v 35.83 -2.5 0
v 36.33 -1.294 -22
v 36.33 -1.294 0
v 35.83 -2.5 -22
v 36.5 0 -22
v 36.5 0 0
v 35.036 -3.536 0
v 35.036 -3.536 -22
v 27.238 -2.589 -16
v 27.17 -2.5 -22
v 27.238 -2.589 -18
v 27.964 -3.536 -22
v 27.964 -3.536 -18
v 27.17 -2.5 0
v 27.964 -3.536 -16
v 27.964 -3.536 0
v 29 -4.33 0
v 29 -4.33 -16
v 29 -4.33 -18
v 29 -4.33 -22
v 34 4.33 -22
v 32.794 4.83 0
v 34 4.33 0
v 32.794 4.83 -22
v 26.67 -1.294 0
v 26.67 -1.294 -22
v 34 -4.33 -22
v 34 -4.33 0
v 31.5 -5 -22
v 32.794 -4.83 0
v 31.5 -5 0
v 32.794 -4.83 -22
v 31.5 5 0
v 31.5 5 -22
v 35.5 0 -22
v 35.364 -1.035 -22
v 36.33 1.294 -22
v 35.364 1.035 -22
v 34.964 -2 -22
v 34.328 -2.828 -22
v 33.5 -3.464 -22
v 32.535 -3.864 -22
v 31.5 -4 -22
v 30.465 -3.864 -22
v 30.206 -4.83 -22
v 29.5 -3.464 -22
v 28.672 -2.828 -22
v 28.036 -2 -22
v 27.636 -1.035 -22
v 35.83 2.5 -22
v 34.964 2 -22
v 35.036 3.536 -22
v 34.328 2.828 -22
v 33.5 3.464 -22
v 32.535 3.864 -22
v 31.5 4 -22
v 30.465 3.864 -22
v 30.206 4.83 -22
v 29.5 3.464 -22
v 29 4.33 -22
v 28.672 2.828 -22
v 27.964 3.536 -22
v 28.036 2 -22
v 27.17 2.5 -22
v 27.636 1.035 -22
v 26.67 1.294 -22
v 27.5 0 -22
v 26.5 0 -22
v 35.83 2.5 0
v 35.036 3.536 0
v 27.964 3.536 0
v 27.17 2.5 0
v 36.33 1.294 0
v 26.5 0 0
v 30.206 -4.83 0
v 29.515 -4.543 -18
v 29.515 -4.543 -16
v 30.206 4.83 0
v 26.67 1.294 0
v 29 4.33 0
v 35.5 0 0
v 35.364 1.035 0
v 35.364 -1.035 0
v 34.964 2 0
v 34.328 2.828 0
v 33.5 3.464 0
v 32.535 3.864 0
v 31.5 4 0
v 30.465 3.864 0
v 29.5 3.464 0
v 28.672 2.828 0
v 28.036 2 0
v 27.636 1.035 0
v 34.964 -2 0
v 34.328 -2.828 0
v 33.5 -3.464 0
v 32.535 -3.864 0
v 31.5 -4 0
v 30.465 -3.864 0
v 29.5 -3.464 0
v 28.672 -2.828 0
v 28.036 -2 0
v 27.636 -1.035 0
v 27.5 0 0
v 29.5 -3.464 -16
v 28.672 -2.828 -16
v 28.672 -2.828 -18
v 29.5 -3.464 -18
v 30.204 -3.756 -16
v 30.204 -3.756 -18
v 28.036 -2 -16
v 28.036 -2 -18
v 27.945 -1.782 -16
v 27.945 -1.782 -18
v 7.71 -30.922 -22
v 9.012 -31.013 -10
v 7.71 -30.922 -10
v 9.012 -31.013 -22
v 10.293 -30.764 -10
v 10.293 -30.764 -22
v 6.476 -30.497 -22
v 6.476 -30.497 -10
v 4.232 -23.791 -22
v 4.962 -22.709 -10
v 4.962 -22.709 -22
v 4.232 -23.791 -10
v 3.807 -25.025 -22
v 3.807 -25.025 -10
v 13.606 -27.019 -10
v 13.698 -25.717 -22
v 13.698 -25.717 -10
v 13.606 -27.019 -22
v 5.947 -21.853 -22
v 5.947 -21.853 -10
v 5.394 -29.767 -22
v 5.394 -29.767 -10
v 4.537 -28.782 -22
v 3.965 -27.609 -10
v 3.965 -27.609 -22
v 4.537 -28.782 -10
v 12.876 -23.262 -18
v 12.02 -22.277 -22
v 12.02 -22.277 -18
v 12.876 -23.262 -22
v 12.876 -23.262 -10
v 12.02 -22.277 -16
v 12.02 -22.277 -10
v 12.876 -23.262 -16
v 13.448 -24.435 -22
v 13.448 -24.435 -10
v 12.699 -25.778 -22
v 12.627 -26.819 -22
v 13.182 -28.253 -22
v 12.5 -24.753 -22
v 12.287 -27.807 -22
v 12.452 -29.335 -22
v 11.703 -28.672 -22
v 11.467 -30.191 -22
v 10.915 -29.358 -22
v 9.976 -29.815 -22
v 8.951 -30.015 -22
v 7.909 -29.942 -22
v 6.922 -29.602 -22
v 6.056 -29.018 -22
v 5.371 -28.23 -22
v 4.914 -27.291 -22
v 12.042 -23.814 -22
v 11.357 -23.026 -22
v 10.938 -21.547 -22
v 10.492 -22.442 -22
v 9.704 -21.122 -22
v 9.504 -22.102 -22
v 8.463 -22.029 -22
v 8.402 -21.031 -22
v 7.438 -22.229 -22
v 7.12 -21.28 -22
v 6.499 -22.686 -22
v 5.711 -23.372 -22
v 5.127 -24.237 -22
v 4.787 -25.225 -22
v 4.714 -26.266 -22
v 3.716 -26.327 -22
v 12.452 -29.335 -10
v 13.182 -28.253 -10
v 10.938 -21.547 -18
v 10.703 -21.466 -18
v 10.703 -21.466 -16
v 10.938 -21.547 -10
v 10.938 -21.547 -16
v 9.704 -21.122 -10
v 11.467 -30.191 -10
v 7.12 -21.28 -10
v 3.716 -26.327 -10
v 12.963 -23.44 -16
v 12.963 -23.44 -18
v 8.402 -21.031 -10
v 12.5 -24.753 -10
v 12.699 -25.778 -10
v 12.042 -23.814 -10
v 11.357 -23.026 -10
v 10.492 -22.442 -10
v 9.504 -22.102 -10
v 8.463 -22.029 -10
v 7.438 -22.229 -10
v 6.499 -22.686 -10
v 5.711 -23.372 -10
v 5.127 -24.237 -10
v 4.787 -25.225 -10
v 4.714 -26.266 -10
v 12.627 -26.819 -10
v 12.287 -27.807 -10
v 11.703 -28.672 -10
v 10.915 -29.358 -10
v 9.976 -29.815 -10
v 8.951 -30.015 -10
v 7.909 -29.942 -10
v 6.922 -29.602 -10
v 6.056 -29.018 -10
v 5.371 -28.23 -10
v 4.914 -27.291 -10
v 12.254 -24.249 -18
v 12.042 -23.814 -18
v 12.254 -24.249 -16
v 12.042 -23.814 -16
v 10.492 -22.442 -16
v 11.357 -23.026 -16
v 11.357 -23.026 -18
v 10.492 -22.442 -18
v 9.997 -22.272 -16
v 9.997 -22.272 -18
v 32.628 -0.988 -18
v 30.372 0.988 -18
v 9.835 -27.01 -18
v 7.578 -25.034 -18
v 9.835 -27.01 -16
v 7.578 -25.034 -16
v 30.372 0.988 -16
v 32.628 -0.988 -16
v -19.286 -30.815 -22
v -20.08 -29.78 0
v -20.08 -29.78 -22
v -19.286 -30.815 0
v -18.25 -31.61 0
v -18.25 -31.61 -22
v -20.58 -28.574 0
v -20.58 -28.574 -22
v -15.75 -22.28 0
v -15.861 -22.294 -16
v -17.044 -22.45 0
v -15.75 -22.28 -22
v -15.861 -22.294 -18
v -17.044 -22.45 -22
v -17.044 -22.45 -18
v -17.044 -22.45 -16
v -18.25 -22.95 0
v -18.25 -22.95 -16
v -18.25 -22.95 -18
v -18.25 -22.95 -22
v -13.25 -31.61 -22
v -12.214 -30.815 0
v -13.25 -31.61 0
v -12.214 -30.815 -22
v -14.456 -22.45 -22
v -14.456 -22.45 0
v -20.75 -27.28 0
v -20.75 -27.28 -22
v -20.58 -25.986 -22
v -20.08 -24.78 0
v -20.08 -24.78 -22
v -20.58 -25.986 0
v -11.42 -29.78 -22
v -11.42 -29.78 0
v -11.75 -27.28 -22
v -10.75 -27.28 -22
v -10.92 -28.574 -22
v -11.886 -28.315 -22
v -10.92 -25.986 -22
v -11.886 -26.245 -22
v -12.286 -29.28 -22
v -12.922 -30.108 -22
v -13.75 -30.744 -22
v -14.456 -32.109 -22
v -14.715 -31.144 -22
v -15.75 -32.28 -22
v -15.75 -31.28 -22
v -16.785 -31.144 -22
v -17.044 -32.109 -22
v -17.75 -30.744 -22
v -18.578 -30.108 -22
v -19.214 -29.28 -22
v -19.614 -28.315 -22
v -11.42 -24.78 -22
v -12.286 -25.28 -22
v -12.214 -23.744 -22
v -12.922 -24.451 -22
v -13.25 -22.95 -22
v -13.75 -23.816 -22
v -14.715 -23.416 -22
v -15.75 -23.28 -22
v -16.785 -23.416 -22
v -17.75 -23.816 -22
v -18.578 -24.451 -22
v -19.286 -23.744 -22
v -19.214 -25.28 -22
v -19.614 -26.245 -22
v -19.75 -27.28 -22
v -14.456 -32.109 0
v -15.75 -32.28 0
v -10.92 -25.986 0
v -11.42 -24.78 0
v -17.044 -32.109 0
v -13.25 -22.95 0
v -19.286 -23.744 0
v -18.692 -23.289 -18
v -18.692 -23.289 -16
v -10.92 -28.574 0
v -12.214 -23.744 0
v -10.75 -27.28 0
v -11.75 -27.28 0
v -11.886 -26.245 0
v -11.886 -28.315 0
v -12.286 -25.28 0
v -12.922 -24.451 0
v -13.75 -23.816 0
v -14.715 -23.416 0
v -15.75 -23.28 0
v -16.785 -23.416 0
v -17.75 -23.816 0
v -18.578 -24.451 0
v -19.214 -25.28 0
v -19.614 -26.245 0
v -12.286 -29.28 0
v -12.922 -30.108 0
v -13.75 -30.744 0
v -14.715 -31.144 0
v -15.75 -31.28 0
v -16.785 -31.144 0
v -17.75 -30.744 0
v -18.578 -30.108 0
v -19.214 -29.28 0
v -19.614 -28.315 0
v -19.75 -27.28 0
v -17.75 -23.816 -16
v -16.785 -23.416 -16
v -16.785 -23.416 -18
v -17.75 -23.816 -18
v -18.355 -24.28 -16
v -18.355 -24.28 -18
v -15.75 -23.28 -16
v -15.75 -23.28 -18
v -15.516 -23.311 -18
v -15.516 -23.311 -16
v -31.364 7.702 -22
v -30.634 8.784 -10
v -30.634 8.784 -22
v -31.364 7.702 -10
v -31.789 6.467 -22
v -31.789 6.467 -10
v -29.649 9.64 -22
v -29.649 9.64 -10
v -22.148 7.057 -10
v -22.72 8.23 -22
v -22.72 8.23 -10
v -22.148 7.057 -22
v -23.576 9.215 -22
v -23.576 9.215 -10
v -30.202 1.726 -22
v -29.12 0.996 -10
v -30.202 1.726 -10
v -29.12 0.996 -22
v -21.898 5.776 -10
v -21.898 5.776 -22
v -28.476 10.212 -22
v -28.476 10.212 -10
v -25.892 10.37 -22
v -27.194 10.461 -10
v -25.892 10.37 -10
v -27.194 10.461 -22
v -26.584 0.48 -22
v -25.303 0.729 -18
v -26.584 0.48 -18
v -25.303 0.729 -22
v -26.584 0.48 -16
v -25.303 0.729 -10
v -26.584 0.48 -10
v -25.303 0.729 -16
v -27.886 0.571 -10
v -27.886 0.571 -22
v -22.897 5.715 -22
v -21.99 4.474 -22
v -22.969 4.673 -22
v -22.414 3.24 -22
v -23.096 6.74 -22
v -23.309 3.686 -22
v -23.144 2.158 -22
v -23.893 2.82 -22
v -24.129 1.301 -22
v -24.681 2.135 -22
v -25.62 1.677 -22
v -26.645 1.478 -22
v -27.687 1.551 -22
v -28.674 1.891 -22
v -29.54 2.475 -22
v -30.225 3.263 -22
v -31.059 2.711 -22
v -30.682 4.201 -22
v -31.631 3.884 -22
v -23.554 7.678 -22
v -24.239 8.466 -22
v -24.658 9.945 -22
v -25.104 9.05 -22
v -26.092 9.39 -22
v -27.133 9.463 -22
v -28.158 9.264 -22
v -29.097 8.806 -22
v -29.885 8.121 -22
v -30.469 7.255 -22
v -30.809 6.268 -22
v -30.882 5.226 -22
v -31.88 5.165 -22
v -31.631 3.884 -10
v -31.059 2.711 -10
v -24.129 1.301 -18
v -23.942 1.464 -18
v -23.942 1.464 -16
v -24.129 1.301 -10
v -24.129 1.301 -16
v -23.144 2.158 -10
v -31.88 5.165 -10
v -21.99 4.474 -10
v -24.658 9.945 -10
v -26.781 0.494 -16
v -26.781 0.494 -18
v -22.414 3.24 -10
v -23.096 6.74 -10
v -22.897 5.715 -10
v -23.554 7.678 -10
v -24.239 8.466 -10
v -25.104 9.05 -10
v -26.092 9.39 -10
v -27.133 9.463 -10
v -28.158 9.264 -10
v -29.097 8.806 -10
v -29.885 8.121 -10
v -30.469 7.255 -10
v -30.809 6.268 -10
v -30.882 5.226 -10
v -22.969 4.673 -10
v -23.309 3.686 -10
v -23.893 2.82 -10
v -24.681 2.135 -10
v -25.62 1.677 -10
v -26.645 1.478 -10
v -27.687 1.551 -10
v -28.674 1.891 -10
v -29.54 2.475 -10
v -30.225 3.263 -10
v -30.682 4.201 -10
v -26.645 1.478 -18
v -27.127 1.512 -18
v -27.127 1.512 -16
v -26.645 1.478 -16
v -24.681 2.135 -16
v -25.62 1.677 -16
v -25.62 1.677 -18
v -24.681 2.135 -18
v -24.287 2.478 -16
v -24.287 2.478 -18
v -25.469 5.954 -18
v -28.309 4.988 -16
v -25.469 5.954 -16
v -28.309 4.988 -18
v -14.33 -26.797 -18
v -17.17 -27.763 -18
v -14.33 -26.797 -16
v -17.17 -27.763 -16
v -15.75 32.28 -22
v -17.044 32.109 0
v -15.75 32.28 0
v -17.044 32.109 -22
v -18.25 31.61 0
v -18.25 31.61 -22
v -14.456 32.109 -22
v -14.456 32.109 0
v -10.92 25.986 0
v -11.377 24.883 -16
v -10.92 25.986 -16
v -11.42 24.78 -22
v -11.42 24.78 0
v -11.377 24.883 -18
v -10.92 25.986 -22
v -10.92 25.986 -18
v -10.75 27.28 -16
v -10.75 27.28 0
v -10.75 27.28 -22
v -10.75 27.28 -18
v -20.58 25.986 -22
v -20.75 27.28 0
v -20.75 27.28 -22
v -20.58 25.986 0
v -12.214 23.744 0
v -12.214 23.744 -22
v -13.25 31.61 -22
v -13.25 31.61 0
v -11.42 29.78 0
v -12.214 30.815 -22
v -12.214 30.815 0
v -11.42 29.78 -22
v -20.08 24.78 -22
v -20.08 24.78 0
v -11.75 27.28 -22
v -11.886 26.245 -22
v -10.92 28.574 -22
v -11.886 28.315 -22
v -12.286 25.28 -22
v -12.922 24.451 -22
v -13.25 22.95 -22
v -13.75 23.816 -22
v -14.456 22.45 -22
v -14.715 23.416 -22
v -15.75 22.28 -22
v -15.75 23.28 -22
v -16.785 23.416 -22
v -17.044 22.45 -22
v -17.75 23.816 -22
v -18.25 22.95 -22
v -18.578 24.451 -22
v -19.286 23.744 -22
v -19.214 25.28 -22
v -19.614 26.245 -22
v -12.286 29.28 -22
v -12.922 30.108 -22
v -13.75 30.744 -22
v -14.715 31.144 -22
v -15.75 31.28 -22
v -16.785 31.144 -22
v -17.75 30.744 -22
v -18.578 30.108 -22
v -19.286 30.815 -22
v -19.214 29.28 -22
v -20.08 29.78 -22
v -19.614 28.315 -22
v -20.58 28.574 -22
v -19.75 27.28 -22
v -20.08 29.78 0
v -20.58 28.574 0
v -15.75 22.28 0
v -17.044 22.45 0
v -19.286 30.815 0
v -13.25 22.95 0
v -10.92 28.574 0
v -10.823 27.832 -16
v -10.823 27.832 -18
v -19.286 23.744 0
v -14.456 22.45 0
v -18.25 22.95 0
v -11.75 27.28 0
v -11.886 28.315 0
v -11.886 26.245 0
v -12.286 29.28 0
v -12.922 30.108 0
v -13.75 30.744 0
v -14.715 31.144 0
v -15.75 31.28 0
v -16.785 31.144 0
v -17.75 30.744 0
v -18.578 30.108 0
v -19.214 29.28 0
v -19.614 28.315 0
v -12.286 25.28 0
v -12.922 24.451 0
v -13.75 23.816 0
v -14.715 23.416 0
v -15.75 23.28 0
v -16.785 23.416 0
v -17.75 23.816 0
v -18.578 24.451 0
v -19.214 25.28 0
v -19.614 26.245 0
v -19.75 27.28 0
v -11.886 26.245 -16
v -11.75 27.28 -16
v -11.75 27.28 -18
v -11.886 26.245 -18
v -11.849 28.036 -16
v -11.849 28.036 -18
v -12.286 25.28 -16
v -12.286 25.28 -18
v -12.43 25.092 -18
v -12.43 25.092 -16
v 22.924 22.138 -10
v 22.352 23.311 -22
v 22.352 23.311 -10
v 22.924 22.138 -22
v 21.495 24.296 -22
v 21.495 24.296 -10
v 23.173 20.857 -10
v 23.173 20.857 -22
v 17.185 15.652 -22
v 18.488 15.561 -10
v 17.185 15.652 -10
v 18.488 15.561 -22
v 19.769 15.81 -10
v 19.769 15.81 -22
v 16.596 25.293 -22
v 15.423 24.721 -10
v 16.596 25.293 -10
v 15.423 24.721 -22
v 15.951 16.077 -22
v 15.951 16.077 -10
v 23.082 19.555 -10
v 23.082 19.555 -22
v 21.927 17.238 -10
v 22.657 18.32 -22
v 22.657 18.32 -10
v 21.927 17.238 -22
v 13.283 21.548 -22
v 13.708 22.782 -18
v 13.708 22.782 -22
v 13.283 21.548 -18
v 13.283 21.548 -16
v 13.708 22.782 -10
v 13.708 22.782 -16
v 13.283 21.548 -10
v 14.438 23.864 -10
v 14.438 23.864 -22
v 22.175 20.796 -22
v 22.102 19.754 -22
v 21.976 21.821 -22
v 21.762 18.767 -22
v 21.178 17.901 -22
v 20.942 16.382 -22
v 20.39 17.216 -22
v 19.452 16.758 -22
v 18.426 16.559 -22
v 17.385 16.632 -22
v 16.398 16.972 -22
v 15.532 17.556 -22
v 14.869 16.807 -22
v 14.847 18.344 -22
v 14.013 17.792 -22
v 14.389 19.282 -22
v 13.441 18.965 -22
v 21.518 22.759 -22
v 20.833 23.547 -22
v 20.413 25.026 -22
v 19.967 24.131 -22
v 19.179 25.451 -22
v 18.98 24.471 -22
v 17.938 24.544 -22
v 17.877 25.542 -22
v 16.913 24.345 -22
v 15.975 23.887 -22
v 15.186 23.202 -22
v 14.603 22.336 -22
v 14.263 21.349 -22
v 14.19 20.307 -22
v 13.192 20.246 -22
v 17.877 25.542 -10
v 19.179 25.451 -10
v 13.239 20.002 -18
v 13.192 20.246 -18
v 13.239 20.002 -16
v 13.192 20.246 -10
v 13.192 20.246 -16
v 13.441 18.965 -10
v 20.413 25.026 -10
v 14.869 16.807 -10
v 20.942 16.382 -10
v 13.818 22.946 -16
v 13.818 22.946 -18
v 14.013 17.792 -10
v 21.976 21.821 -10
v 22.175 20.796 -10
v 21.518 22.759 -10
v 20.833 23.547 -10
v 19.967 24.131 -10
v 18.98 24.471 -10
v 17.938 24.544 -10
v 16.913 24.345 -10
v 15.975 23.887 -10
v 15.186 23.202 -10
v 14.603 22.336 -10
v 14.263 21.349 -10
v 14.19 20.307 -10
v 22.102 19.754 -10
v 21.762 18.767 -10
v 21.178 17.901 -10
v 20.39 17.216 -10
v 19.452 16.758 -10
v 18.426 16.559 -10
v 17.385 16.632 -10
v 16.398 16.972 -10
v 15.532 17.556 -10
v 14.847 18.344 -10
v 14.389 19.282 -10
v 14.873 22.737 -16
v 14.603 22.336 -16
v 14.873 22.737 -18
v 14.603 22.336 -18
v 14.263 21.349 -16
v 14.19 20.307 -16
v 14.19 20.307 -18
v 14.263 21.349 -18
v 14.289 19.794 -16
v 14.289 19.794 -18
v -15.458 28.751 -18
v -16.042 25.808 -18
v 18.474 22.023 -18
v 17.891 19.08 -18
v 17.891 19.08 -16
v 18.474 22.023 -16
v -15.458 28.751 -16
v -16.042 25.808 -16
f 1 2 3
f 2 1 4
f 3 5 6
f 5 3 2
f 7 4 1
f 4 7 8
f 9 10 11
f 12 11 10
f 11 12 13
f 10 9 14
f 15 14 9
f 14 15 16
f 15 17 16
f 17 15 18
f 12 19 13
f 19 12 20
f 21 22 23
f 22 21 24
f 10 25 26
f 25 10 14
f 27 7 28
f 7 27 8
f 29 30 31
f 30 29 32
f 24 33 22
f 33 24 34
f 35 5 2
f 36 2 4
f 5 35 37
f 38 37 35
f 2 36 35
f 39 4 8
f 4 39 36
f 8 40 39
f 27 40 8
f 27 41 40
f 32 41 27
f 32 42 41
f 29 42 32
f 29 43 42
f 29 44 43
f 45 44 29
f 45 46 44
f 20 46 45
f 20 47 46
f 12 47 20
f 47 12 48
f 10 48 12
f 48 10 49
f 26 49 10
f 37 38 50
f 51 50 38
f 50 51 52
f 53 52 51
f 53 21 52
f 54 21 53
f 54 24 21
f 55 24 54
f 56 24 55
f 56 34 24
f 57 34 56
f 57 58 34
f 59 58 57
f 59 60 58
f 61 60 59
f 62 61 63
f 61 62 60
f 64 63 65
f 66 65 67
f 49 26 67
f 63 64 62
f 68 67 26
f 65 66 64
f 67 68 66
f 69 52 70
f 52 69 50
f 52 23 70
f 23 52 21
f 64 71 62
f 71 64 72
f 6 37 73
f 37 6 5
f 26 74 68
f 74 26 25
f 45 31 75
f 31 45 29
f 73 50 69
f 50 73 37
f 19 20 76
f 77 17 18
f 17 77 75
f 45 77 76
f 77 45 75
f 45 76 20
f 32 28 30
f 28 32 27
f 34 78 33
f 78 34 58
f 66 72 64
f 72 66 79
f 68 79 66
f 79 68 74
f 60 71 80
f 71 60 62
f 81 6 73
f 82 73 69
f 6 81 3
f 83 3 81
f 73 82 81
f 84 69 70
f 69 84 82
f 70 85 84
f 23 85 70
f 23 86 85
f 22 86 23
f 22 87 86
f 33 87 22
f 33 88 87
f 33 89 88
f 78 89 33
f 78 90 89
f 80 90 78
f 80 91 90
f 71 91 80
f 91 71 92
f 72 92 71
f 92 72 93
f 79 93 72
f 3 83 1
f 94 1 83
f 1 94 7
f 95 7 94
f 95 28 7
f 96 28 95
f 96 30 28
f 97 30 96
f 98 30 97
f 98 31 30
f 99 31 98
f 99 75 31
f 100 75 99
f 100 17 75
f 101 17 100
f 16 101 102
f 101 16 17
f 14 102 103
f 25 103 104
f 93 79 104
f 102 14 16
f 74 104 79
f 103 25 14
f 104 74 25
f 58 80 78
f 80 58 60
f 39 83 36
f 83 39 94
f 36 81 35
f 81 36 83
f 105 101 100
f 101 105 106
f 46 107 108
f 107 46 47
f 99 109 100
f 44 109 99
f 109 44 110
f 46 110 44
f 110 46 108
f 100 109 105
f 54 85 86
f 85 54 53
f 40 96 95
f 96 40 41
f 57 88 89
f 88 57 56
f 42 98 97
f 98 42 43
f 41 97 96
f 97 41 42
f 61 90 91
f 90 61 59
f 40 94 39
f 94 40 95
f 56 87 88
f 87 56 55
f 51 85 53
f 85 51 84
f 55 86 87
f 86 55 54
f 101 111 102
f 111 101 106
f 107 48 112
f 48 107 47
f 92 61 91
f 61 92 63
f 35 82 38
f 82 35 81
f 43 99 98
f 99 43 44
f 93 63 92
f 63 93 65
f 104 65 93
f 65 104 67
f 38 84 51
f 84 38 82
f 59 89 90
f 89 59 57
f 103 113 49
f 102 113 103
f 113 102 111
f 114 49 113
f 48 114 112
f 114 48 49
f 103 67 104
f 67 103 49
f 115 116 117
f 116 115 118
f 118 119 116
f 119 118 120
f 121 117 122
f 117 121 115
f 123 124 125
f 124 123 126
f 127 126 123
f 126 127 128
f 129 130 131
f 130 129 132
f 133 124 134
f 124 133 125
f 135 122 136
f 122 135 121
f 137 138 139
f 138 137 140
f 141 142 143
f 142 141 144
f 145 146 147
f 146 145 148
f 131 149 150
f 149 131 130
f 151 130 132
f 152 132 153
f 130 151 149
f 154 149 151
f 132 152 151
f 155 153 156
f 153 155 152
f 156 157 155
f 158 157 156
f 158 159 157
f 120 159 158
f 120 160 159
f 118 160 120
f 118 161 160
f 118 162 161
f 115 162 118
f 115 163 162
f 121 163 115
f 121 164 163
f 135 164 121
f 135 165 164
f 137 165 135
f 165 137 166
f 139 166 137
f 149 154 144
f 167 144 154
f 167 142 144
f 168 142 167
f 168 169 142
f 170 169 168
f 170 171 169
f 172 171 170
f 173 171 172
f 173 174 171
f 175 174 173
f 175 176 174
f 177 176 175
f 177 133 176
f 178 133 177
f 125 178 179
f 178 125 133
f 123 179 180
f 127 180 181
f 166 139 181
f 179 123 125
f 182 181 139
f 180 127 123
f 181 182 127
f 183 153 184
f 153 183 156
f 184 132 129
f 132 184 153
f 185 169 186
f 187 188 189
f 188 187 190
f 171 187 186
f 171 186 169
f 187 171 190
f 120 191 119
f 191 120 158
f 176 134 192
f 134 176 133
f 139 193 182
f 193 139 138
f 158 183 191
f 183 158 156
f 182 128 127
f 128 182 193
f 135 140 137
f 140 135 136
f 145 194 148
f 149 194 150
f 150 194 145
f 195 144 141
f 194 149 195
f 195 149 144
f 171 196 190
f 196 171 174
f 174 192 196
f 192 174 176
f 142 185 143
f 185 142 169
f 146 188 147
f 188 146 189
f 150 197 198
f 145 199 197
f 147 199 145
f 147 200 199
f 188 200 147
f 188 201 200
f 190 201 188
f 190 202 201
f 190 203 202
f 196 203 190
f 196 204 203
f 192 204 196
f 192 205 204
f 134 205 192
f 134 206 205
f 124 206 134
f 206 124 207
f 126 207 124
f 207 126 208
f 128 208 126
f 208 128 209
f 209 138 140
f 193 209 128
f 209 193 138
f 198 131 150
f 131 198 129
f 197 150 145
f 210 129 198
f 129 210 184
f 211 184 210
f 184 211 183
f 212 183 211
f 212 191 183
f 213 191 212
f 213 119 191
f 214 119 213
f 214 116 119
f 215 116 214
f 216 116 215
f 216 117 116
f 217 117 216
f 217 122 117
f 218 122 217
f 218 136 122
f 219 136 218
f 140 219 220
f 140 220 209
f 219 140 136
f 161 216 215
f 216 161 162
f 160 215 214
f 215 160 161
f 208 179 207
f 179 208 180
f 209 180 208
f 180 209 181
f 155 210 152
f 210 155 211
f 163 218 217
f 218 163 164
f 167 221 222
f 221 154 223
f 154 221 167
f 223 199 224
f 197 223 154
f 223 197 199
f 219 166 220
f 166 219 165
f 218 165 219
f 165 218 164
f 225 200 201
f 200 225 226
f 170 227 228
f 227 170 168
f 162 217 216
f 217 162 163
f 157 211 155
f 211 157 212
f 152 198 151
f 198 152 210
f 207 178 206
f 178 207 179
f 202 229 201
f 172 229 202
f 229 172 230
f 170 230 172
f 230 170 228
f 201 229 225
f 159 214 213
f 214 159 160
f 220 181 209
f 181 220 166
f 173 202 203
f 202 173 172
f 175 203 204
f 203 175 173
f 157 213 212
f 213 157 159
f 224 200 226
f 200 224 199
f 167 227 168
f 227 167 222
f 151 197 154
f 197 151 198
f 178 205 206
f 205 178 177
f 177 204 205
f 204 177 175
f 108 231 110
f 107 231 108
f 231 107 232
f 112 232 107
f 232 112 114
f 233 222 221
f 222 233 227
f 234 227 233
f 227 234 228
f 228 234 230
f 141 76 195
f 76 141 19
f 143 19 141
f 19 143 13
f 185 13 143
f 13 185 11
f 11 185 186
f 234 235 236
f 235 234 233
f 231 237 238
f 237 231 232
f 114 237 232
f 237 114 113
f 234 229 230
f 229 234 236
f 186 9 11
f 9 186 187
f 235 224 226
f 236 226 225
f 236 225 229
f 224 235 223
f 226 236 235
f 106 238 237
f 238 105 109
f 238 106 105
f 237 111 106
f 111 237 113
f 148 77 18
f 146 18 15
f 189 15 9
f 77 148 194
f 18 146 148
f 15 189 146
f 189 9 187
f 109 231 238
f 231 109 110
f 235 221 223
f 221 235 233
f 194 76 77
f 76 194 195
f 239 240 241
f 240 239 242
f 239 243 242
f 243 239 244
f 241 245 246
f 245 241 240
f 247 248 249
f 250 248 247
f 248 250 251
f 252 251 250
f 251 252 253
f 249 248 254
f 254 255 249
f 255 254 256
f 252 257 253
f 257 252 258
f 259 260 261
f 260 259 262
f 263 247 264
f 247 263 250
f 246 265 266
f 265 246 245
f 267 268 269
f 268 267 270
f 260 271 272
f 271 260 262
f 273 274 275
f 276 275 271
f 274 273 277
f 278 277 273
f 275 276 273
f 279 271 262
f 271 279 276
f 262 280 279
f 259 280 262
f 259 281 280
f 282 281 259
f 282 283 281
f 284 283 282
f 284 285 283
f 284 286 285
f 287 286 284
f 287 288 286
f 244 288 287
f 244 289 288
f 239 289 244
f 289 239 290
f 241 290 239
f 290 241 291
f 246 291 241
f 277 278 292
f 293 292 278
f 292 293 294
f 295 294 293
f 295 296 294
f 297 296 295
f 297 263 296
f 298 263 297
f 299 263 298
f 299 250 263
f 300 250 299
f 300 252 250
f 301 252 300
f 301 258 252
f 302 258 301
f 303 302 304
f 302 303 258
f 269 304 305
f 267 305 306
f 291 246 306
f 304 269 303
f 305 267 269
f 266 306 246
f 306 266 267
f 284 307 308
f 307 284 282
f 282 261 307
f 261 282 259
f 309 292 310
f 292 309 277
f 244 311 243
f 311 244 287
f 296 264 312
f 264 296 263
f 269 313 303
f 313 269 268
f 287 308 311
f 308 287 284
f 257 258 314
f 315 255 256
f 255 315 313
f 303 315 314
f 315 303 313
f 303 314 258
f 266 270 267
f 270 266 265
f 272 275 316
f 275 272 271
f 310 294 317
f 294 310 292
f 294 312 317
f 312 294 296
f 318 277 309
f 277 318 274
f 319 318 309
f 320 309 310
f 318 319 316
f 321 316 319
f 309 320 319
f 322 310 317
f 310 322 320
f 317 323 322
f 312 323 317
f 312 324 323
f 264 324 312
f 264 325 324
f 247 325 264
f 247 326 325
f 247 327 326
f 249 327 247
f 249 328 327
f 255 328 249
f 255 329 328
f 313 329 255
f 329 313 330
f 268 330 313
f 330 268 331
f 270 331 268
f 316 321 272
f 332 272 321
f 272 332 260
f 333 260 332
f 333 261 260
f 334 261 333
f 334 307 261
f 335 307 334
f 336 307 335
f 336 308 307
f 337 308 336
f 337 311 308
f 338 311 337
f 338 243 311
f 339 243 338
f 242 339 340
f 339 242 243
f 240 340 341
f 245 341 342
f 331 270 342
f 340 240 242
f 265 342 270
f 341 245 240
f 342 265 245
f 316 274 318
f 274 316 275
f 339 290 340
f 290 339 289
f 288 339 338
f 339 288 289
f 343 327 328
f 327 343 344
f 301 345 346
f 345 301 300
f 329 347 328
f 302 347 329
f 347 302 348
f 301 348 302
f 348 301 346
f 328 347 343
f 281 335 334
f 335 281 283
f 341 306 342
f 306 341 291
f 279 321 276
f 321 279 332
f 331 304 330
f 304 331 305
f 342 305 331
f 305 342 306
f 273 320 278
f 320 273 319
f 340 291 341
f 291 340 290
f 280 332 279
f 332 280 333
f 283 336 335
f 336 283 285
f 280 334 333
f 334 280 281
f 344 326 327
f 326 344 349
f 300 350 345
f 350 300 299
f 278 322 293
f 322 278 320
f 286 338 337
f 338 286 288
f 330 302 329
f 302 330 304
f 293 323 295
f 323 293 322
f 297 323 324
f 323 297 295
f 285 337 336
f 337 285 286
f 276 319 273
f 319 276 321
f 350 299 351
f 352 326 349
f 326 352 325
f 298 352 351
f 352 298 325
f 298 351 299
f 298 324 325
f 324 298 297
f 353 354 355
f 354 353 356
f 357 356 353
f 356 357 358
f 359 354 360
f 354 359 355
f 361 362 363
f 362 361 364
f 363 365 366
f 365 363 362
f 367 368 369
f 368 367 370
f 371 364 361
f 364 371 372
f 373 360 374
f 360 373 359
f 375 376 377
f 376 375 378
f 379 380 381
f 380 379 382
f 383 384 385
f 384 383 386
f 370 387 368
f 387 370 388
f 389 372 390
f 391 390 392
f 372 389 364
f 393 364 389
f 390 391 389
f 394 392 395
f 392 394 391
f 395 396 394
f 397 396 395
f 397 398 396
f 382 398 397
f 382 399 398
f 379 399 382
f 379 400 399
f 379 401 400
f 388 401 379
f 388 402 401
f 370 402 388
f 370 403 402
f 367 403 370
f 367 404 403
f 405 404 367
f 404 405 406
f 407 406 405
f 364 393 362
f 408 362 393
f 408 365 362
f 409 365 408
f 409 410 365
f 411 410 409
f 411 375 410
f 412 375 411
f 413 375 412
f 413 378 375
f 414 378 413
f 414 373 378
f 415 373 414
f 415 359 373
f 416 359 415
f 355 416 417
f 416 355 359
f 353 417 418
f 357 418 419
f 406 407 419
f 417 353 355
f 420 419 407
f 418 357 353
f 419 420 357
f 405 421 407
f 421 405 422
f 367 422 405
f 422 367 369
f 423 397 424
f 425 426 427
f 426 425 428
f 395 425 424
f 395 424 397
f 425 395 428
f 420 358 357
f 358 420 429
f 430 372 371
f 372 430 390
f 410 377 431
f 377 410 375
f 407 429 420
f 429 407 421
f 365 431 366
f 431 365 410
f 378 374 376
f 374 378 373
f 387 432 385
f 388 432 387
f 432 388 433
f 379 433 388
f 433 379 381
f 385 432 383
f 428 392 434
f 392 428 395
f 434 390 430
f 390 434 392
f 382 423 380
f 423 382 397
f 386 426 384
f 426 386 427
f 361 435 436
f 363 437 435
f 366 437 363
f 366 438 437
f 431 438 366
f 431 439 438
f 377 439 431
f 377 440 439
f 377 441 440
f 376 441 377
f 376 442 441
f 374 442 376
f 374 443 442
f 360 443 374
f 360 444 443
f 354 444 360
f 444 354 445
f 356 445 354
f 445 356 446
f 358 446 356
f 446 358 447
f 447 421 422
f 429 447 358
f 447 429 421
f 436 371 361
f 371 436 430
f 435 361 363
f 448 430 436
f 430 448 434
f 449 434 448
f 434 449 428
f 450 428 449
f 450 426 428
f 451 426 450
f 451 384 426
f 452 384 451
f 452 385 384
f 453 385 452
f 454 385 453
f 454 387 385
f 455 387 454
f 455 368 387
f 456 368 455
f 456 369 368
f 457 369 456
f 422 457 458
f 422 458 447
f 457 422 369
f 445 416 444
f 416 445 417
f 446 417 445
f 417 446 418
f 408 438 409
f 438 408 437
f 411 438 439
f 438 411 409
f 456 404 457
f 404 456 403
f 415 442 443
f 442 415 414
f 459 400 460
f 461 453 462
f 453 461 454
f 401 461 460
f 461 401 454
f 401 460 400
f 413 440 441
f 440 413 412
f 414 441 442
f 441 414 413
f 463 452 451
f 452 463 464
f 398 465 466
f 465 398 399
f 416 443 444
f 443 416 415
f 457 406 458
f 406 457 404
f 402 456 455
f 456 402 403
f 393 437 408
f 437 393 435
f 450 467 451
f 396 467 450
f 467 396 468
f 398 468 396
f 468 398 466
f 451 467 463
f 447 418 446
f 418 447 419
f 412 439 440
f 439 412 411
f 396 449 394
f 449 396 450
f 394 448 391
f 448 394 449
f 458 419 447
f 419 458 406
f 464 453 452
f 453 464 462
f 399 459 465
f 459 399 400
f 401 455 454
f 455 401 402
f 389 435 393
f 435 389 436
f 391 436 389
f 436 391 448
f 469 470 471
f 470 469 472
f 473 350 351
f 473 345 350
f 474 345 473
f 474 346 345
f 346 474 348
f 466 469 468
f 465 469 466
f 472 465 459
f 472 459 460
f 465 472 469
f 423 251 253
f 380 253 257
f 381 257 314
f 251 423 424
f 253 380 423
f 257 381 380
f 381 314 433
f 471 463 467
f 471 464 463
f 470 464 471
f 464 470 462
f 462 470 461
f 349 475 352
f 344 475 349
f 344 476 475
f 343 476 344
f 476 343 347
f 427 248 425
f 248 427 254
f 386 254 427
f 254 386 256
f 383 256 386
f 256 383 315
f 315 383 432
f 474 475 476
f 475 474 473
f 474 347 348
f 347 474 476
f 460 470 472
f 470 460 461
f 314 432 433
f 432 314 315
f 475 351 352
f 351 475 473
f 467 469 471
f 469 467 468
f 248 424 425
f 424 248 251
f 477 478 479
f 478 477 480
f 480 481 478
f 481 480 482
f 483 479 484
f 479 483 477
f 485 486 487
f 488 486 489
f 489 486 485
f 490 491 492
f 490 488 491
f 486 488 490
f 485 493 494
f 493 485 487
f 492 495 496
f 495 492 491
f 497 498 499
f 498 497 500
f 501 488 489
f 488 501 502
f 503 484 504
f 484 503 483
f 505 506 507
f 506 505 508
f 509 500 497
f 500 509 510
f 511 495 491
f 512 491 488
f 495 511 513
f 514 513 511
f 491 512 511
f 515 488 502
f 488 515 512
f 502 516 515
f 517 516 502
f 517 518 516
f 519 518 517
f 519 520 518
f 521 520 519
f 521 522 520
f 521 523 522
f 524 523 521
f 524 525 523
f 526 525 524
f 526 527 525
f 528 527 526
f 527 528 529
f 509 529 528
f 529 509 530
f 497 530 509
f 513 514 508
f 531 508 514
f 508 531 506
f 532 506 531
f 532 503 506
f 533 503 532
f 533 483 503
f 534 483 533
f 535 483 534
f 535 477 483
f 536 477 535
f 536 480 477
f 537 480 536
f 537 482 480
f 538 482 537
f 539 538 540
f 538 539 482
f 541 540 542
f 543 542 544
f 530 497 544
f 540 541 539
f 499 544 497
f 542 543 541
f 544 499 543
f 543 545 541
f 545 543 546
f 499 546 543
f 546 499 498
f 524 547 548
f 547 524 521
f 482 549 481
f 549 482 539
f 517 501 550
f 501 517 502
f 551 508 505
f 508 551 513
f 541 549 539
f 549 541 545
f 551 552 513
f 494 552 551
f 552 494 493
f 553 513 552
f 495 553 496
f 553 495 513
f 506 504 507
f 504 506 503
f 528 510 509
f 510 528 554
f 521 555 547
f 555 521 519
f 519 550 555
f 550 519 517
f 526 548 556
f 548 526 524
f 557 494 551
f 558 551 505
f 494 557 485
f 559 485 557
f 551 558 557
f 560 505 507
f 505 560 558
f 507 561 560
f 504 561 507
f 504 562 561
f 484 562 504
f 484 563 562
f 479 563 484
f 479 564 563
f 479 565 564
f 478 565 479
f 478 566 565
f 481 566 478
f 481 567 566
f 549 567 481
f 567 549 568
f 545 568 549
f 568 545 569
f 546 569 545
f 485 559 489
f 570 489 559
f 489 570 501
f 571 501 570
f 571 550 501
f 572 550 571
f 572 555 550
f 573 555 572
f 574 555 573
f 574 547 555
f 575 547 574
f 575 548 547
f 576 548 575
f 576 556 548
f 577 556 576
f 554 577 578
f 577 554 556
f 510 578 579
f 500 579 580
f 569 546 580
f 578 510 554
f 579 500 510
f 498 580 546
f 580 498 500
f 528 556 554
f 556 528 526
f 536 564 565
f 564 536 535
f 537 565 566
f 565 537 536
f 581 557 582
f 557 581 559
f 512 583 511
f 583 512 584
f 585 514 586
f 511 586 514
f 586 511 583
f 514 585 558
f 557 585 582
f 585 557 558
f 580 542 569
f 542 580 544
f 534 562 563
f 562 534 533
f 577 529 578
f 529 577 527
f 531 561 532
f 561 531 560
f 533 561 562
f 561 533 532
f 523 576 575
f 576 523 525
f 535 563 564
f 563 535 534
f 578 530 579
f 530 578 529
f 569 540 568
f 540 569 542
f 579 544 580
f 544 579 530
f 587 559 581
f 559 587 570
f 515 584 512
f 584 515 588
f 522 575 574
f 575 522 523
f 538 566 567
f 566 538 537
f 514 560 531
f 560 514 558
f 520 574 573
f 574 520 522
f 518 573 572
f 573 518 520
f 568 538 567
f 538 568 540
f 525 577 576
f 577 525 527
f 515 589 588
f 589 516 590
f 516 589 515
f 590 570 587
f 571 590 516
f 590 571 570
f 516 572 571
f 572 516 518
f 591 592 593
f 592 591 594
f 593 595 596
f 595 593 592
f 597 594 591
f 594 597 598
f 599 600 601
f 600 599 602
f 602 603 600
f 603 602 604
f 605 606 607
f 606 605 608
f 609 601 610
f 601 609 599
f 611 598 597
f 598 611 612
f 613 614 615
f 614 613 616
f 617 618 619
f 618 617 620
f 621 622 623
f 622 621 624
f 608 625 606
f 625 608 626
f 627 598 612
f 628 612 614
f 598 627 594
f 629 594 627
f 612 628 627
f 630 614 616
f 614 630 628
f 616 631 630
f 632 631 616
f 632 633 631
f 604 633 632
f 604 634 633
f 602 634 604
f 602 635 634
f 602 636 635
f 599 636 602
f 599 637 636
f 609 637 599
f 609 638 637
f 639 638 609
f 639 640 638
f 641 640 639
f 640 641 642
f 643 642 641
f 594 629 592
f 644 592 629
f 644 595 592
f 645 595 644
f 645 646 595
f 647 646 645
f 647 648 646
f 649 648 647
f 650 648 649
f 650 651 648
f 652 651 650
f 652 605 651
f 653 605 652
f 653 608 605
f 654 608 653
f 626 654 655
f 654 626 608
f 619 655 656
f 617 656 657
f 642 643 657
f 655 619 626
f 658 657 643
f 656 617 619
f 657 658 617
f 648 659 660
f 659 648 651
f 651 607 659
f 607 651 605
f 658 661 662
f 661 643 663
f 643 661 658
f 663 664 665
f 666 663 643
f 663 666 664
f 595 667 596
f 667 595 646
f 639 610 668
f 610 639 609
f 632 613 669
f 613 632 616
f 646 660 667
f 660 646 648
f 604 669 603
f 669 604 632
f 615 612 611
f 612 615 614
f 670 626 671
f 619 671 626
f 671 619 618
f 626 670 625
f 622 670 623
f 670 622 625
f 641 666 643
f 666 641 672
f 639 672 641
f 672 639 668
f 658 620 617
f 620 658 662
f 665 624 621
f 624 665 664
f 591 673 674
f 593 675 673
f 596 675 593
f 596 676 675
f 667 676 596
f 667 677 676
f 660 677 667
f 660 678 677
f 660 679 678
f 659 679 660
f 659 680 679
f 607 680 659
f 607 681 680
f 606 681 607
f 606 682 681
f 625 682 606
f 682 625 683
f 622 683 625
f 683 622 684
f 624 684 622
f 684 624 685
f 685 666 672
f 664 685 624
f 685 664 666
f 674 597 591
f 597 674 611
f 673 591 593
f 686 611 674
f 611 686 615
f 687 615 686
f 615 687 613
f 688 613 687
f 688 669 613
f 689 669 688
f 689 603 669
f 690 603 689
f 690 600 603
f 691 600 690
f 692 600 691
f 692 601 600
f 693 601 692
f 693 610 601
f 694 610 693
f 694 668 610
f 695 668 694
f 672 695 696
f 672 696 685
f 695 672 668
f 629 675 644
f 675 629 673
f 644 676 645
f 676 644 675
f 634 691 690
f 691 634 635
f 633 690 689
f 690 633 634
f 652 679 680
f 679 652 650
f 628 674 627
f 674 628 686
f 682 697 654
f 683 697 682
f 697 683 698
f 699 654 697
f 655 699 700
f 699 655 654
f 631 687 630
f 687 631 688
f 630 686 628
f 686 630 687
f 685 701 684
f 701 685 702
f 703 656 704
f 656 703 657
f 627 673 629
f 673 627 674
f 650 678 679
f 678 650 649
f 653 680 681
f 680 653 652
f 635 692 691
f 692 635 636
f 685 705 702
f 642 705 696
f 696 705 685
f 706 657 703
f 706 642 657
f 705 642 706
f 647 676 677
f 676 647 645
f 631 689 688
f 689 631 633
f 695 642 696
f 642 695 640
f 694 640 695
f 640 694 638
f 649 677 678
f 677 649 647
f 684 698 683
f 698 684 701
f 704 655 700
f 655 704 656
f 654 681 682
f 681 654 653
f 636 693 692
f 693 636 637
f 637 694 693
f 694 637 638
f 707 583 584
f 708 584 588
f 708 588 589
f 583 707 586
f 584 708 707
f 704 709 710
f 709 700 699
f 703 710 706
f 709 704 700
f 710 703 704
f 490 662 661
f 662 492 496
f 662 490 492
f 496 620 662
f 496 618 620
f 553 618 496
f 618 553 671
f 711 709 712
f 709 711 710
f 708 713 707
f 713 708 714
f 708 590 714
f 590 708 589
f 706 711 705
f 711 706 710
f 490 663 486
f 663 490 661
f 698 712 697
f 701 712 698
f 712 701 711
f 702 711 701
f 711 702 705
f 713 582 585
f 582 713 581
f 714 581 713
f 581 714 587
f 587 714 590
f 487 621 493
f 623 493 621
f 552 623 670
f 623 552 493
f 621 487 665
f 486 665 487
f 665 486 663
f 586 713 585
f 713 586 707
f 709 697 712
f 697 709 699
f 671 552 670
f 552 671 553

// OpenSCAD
// ============================================================
// CARRIER_3 — Pin cage (3 sectors, each with Po + Pi boss + web)
// ============================================================

include <../params.scad>

module carrier_3_sector(sector_ang) {
    // Po boss — full gearbox height Z=0 to 22
    rotate([0, 0, sector_ang])
    translate([PO_ORBIT, 0, PO_ZBOT])
    difference() {
        cylinder(d=CAGE_BOSS_OD, h=PO_ZTOP - PO_ZBOT, $fn=24);
        translate([0, 0, -0.1])
        cylinder(d=CAGE_BOSS_ID, h=PO_ZTOP - PO_ZBOT + 0.2, $fn=24);
    }

    // Pi boss — Z = PI_ZBOT-2 to PI_ZTOP (extends below Pi gear for support)
    // This boss passes through carrier_2's oversized Pi holes (D=13.4)
    PI_BOSS_ZBOT = PI_ZBOT - 2;
    rotate([0, 0, sector_ang + PI_ANG_OFFSET])
    translate([PI_ORBIT_ACTUAL, 0, PI_BOSS_ZBOT])
    difference() {
        cylinder(d=CAGE_BOSS_OD, h=PI_ZTOP - PI_BOSS_ZBOT, $fn=24);
        translate([0, 0, -0.1])
        cylinder(d=CAGE_BOSS_ID, h=PI_ZTOP - PI_BOSS_ZBOT + 0.2, $fn=24);
    }

    // Bridging web between Po and Pi bosses (structural strut)
    // Positioned at mid-height of Pi zone, connecting the two boss centers
    WEB_Z = (PI_ZBOT + PI_ZTOP) / 2 - CAGE_WEB_H / 2;
    po_x = PO_ORBIT * cos(sector_ang);
    po_y = PO_ORBIT * sin(sector_ang);
    pi_x = PI_ORBIT_ACTUAL * cos(sector_ang + PI_ANG_OFFSET);
    pi_y = PI_ORBIT_ACTUAL * sin(sector_ang + PI_ANG_OFFSET);

    bridge_len = sqrt((pi_x - po_x) * (pi_x - po_x) + (pi_y - po_y) * (pi_y - po_y));
    bridge_ang = atan2(pi_y - po_y, pi_x - po_x);

    translate([po_x, po_y, WEB_Z])
    rotate([0, 0, bridge_ang])
    translate([0, -CAGE_WEB_W/2, 0])
    cube([bridge_len, CAGE_WEB_W, CAGE_WEB_H]);
}

module carrier_3_assembly() {
    color(C_CAR3)
    rotate([0, 0, ANG_CARRIER])
    for (i = [0:2])
        carrier_3_sector(i * 120);
}

// ============================================================
// STANDALONE PREVIEW
// ============================================================
rotate([180, 0, 0]) carrier_3_assembly();
